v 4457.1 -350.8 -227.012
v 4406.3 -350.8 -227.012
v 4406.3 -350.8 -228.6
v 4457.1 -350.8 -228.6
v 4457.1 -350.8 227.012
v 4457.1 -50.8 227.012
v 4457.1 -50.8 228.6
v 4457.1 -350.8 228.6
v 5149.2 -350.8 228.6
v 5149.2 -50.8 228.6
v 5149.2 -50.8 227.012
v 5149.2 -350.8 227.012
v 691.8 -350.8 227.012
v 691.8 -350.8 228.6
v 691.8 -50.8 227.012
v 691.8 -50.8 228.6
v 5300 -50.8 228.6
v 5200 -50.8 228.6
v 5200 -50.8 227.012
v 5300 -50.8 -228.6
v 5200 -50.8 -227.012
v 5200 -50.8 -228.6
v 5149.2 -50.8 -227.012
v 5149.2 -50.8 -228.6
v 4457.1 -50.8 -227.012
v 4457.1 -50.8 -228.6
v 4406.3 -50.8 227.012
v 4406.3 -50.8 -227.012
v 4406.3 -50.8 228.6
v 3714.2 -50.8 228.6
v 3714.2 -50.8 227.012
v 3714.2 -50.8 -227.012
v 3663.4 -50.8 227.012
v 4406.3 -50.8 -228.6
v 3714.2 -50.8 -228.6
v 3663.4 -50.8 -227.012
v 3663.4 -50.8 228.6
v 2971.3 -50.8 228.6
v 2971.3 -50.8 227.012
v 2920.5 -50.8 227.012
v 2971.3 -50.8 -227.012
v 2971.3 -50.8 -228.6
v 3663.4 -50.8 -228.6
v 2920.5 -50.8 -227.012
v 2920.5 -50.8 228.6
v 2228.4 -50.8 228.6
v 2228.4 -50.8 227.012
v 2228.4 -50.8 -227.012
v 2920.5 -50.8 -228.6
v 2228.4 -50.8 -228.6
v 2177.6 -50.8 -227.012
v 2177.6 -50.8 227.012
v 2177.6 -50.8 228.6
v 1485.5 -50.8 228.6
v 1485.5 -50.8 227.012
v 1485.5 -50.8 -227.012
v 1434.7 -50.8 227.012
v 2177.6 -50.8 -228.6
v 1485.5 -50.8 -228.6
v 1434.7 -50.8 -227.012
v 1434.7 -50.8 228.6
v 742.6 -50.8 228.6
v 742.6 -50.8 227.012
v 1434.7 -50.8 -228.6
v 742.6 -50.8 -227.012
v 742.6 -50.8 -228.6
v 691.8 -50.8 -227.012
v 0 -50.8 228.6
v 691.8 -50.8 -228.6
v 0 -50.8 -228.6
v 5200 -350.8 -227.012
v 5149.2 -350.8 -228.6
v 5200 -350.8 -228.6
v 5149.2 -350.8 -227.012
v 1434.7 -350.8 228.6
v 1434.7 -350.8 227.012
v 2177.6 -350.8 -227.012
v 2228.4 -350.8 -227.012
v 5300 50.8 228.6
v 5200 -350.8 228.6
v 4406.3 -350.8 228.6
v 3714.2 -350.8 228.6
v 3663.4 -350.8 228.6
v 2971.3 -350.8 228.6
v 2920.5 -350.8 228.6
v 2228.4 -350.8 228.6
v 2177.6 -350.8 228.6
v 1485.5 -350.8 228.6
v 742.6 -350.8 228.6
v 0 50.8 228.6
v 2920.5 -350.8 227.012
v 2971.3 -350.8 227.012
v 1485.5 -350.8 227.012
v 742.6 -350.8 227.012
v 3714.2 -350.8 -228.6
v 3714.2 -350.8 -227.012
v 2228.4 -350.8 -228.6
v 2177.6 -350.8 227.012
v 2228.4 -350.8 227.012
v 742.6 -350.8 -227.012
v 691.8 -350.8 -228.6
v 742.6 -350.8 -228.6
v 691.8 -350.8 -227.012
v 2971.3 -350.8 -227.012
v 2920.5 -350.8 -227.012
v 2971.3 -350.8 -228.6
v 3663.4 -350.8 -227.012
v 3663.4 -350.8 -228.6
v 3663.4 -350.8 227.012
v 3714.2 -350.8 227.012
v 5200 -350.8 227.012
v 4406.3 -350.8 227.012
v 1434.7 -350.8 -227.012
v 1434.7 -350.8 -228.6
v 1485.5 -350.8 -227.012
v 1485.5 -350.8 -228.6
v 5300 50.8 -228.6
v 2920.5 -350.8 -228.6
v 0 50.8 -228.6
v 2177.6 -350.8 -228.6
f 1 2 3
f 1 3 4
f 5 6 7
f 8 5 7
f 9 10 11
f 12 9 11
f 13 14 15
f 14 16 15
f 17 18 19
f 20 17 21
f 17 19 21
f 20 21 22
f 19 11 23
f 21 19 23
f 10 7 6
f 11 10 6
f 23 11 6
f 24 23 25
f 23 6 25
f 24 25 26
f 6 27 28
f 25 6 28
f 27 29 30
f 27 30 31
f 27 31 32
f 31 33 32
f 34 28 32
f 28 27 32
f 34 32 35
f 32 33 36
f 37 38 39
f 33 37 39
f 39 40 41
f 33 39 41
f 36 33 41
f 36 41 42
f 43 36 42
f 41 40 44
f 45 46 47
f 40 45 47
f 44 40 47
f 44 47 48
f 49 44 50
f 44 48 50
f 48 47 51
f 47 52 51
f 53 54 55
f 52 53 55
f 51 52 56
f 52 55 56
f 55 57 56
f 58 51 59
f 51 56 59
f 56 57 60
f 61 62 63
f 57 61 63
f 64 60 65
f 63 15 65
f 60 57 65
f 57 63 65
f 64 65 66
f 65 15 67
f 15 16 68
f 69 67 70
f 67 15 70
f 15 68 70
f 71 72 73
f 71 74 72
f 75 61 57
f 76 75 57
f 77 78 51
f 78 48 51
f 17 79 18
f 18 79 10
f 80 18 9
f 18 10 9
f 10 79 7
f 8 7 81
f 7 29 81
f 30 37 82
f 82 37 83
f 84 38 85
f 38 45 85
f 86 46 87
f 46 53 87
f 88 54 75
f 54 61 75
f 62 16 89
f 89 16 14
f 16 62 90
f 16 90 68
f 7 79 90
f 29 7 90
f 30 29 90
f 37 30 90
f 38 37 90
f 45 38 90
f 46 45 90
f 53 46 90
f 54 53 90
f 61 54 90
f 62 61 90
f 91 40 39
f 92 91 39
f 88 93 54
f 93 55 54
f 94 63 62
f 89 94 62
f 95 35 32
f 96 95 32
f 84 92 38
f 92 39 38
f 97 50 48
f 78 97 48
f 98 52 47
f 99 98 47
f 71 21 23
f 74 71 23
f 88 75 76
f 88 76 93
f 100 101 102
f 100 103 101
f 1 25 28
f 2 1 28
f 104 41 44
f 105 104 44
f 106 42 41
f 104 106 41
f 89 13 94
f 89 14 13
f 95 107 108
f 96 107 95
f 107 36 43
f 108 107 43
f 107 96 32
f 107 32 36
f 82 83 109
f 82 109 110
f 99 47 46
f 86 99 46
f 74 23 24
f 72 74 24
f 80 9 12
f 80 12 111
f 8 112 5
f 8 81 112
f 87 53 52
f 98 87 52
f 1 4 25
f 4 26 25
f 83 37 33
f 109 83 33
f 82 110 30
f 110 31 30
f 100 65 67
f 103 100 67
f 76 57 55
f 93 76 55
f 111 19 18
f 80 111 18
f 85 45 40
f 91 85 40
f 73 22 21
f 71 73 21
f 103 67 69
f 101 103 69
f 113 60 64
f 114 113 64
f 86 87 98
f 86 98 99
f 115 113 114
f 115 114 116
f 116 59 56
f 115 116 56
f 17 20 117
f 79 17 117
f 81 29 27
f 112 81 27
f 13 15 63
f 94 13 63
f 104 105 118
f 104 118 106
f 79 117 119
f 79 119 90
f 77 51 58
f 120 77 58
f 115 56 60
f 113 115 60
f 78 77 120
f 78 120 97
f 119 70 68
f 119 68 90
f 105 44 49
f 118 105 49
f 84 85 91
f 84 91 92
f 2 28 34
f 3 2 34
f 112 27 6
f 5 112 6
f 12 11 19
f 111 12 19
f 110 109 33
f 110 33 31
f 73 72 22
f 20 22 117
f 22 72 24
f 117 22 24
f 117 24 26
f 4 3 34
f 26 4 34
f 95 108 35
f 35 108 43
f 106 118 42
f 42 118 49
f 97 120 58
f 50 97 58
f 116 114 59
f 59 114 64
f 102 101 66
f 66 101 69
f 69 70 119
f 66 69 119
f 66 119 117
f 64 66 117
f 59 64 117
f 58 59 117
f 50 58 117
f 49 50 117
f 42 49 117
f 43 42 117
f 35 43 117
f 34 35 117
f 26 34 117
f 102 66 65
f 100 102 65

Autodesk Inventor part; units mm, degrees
ref_plane "YZ Plane" through (0, 0, 0) normal (1, 0, 0) x (0, 1, 0)
ref_plane "XZ Plane" through (0, 0, 0) normal (0, 1, 0) x (-1, 0, 0)
ref_plane "XY Plane" through (0, 0, 0) normal (0, 0, 1) x (1, 0, 0)
sketch "Sketch1" plane through (0, 0, 0) normal (1, 0, 0) x (0, 1, 0)
  line L0 (50.8, 228.6) -> (-50.8, 228.6)
  line L1 (-50.8, 228.6) -> (-50.8, -228.6)
  line L2 (-50.8, -228.6) -> (50.8, -228.6)
  line L3 (50.8, -228.6) -> (50.8, 228.6)
  line L4 (50.8, 228.6) -> (-50.8, -228.6) construction
  line L5 (-50.8, 228.6) -> (50.8, -228.6) construction
  point P0 (0, 0)
  dimension "d0" = 101.6
  dimension "d1" = 457.2
extrude "Extrusion1" add sketch "Sketch1" along normal blind 5300
sketch "Sketch2" plane through (0, -50.8, -228.6) normal (0, -1, 0) x (1, 0, 0)
  line L0 (5200, 457.2) -> (5149.2, 457.2)
  line L1 (5149.2, 457.2) -> (5149.2, 455.6125)
  line L2 (5149.2, 455.6125) -> (5200, 455.6125)
  line L3 (5200, 455.6125) -> (5200, 457.2)
  line L4 (5300, 457.2) -> (5300, 0) projected
  line L5 (0, 457.2) -> (5300, 457.2) projected
  point P0 (0, 228.6)
  dimension "d4" = 100
  dimension "d5" = 0
  dimension "d6" = 1.5875
  dimension "d7" = 50.8
extrude "Extrusion2" add sketch "Sketch2" along normal blind 300
pattern_linear "Rectangular Pattern1" count 2 spacing 455.6125 along (0, 0, -1) count 7 spacing 742.9 along (-1, 0, 0) of "Extrusion2"
equation "\"d0\" = tray_h"
equation "\"d1\" = tray_w"
equation "\"d2\" = tray_e"
equation "\"d6\" = leg_w"
equation "\"d7\" = leg_h"
equation "\"d8\" = leg_e"
equation "\"tray_h\" = 101.6"
equation "\"tray_w\" = 457.2"
equation "\"tray_e\" = 5300"
equation "\"leg_h\" = 50.8"
equation "\"leg_w\" = 1.5875"
equation "\"leg_e\" = 300"
properties part number "CableTray" material "Aluminum 6061"
